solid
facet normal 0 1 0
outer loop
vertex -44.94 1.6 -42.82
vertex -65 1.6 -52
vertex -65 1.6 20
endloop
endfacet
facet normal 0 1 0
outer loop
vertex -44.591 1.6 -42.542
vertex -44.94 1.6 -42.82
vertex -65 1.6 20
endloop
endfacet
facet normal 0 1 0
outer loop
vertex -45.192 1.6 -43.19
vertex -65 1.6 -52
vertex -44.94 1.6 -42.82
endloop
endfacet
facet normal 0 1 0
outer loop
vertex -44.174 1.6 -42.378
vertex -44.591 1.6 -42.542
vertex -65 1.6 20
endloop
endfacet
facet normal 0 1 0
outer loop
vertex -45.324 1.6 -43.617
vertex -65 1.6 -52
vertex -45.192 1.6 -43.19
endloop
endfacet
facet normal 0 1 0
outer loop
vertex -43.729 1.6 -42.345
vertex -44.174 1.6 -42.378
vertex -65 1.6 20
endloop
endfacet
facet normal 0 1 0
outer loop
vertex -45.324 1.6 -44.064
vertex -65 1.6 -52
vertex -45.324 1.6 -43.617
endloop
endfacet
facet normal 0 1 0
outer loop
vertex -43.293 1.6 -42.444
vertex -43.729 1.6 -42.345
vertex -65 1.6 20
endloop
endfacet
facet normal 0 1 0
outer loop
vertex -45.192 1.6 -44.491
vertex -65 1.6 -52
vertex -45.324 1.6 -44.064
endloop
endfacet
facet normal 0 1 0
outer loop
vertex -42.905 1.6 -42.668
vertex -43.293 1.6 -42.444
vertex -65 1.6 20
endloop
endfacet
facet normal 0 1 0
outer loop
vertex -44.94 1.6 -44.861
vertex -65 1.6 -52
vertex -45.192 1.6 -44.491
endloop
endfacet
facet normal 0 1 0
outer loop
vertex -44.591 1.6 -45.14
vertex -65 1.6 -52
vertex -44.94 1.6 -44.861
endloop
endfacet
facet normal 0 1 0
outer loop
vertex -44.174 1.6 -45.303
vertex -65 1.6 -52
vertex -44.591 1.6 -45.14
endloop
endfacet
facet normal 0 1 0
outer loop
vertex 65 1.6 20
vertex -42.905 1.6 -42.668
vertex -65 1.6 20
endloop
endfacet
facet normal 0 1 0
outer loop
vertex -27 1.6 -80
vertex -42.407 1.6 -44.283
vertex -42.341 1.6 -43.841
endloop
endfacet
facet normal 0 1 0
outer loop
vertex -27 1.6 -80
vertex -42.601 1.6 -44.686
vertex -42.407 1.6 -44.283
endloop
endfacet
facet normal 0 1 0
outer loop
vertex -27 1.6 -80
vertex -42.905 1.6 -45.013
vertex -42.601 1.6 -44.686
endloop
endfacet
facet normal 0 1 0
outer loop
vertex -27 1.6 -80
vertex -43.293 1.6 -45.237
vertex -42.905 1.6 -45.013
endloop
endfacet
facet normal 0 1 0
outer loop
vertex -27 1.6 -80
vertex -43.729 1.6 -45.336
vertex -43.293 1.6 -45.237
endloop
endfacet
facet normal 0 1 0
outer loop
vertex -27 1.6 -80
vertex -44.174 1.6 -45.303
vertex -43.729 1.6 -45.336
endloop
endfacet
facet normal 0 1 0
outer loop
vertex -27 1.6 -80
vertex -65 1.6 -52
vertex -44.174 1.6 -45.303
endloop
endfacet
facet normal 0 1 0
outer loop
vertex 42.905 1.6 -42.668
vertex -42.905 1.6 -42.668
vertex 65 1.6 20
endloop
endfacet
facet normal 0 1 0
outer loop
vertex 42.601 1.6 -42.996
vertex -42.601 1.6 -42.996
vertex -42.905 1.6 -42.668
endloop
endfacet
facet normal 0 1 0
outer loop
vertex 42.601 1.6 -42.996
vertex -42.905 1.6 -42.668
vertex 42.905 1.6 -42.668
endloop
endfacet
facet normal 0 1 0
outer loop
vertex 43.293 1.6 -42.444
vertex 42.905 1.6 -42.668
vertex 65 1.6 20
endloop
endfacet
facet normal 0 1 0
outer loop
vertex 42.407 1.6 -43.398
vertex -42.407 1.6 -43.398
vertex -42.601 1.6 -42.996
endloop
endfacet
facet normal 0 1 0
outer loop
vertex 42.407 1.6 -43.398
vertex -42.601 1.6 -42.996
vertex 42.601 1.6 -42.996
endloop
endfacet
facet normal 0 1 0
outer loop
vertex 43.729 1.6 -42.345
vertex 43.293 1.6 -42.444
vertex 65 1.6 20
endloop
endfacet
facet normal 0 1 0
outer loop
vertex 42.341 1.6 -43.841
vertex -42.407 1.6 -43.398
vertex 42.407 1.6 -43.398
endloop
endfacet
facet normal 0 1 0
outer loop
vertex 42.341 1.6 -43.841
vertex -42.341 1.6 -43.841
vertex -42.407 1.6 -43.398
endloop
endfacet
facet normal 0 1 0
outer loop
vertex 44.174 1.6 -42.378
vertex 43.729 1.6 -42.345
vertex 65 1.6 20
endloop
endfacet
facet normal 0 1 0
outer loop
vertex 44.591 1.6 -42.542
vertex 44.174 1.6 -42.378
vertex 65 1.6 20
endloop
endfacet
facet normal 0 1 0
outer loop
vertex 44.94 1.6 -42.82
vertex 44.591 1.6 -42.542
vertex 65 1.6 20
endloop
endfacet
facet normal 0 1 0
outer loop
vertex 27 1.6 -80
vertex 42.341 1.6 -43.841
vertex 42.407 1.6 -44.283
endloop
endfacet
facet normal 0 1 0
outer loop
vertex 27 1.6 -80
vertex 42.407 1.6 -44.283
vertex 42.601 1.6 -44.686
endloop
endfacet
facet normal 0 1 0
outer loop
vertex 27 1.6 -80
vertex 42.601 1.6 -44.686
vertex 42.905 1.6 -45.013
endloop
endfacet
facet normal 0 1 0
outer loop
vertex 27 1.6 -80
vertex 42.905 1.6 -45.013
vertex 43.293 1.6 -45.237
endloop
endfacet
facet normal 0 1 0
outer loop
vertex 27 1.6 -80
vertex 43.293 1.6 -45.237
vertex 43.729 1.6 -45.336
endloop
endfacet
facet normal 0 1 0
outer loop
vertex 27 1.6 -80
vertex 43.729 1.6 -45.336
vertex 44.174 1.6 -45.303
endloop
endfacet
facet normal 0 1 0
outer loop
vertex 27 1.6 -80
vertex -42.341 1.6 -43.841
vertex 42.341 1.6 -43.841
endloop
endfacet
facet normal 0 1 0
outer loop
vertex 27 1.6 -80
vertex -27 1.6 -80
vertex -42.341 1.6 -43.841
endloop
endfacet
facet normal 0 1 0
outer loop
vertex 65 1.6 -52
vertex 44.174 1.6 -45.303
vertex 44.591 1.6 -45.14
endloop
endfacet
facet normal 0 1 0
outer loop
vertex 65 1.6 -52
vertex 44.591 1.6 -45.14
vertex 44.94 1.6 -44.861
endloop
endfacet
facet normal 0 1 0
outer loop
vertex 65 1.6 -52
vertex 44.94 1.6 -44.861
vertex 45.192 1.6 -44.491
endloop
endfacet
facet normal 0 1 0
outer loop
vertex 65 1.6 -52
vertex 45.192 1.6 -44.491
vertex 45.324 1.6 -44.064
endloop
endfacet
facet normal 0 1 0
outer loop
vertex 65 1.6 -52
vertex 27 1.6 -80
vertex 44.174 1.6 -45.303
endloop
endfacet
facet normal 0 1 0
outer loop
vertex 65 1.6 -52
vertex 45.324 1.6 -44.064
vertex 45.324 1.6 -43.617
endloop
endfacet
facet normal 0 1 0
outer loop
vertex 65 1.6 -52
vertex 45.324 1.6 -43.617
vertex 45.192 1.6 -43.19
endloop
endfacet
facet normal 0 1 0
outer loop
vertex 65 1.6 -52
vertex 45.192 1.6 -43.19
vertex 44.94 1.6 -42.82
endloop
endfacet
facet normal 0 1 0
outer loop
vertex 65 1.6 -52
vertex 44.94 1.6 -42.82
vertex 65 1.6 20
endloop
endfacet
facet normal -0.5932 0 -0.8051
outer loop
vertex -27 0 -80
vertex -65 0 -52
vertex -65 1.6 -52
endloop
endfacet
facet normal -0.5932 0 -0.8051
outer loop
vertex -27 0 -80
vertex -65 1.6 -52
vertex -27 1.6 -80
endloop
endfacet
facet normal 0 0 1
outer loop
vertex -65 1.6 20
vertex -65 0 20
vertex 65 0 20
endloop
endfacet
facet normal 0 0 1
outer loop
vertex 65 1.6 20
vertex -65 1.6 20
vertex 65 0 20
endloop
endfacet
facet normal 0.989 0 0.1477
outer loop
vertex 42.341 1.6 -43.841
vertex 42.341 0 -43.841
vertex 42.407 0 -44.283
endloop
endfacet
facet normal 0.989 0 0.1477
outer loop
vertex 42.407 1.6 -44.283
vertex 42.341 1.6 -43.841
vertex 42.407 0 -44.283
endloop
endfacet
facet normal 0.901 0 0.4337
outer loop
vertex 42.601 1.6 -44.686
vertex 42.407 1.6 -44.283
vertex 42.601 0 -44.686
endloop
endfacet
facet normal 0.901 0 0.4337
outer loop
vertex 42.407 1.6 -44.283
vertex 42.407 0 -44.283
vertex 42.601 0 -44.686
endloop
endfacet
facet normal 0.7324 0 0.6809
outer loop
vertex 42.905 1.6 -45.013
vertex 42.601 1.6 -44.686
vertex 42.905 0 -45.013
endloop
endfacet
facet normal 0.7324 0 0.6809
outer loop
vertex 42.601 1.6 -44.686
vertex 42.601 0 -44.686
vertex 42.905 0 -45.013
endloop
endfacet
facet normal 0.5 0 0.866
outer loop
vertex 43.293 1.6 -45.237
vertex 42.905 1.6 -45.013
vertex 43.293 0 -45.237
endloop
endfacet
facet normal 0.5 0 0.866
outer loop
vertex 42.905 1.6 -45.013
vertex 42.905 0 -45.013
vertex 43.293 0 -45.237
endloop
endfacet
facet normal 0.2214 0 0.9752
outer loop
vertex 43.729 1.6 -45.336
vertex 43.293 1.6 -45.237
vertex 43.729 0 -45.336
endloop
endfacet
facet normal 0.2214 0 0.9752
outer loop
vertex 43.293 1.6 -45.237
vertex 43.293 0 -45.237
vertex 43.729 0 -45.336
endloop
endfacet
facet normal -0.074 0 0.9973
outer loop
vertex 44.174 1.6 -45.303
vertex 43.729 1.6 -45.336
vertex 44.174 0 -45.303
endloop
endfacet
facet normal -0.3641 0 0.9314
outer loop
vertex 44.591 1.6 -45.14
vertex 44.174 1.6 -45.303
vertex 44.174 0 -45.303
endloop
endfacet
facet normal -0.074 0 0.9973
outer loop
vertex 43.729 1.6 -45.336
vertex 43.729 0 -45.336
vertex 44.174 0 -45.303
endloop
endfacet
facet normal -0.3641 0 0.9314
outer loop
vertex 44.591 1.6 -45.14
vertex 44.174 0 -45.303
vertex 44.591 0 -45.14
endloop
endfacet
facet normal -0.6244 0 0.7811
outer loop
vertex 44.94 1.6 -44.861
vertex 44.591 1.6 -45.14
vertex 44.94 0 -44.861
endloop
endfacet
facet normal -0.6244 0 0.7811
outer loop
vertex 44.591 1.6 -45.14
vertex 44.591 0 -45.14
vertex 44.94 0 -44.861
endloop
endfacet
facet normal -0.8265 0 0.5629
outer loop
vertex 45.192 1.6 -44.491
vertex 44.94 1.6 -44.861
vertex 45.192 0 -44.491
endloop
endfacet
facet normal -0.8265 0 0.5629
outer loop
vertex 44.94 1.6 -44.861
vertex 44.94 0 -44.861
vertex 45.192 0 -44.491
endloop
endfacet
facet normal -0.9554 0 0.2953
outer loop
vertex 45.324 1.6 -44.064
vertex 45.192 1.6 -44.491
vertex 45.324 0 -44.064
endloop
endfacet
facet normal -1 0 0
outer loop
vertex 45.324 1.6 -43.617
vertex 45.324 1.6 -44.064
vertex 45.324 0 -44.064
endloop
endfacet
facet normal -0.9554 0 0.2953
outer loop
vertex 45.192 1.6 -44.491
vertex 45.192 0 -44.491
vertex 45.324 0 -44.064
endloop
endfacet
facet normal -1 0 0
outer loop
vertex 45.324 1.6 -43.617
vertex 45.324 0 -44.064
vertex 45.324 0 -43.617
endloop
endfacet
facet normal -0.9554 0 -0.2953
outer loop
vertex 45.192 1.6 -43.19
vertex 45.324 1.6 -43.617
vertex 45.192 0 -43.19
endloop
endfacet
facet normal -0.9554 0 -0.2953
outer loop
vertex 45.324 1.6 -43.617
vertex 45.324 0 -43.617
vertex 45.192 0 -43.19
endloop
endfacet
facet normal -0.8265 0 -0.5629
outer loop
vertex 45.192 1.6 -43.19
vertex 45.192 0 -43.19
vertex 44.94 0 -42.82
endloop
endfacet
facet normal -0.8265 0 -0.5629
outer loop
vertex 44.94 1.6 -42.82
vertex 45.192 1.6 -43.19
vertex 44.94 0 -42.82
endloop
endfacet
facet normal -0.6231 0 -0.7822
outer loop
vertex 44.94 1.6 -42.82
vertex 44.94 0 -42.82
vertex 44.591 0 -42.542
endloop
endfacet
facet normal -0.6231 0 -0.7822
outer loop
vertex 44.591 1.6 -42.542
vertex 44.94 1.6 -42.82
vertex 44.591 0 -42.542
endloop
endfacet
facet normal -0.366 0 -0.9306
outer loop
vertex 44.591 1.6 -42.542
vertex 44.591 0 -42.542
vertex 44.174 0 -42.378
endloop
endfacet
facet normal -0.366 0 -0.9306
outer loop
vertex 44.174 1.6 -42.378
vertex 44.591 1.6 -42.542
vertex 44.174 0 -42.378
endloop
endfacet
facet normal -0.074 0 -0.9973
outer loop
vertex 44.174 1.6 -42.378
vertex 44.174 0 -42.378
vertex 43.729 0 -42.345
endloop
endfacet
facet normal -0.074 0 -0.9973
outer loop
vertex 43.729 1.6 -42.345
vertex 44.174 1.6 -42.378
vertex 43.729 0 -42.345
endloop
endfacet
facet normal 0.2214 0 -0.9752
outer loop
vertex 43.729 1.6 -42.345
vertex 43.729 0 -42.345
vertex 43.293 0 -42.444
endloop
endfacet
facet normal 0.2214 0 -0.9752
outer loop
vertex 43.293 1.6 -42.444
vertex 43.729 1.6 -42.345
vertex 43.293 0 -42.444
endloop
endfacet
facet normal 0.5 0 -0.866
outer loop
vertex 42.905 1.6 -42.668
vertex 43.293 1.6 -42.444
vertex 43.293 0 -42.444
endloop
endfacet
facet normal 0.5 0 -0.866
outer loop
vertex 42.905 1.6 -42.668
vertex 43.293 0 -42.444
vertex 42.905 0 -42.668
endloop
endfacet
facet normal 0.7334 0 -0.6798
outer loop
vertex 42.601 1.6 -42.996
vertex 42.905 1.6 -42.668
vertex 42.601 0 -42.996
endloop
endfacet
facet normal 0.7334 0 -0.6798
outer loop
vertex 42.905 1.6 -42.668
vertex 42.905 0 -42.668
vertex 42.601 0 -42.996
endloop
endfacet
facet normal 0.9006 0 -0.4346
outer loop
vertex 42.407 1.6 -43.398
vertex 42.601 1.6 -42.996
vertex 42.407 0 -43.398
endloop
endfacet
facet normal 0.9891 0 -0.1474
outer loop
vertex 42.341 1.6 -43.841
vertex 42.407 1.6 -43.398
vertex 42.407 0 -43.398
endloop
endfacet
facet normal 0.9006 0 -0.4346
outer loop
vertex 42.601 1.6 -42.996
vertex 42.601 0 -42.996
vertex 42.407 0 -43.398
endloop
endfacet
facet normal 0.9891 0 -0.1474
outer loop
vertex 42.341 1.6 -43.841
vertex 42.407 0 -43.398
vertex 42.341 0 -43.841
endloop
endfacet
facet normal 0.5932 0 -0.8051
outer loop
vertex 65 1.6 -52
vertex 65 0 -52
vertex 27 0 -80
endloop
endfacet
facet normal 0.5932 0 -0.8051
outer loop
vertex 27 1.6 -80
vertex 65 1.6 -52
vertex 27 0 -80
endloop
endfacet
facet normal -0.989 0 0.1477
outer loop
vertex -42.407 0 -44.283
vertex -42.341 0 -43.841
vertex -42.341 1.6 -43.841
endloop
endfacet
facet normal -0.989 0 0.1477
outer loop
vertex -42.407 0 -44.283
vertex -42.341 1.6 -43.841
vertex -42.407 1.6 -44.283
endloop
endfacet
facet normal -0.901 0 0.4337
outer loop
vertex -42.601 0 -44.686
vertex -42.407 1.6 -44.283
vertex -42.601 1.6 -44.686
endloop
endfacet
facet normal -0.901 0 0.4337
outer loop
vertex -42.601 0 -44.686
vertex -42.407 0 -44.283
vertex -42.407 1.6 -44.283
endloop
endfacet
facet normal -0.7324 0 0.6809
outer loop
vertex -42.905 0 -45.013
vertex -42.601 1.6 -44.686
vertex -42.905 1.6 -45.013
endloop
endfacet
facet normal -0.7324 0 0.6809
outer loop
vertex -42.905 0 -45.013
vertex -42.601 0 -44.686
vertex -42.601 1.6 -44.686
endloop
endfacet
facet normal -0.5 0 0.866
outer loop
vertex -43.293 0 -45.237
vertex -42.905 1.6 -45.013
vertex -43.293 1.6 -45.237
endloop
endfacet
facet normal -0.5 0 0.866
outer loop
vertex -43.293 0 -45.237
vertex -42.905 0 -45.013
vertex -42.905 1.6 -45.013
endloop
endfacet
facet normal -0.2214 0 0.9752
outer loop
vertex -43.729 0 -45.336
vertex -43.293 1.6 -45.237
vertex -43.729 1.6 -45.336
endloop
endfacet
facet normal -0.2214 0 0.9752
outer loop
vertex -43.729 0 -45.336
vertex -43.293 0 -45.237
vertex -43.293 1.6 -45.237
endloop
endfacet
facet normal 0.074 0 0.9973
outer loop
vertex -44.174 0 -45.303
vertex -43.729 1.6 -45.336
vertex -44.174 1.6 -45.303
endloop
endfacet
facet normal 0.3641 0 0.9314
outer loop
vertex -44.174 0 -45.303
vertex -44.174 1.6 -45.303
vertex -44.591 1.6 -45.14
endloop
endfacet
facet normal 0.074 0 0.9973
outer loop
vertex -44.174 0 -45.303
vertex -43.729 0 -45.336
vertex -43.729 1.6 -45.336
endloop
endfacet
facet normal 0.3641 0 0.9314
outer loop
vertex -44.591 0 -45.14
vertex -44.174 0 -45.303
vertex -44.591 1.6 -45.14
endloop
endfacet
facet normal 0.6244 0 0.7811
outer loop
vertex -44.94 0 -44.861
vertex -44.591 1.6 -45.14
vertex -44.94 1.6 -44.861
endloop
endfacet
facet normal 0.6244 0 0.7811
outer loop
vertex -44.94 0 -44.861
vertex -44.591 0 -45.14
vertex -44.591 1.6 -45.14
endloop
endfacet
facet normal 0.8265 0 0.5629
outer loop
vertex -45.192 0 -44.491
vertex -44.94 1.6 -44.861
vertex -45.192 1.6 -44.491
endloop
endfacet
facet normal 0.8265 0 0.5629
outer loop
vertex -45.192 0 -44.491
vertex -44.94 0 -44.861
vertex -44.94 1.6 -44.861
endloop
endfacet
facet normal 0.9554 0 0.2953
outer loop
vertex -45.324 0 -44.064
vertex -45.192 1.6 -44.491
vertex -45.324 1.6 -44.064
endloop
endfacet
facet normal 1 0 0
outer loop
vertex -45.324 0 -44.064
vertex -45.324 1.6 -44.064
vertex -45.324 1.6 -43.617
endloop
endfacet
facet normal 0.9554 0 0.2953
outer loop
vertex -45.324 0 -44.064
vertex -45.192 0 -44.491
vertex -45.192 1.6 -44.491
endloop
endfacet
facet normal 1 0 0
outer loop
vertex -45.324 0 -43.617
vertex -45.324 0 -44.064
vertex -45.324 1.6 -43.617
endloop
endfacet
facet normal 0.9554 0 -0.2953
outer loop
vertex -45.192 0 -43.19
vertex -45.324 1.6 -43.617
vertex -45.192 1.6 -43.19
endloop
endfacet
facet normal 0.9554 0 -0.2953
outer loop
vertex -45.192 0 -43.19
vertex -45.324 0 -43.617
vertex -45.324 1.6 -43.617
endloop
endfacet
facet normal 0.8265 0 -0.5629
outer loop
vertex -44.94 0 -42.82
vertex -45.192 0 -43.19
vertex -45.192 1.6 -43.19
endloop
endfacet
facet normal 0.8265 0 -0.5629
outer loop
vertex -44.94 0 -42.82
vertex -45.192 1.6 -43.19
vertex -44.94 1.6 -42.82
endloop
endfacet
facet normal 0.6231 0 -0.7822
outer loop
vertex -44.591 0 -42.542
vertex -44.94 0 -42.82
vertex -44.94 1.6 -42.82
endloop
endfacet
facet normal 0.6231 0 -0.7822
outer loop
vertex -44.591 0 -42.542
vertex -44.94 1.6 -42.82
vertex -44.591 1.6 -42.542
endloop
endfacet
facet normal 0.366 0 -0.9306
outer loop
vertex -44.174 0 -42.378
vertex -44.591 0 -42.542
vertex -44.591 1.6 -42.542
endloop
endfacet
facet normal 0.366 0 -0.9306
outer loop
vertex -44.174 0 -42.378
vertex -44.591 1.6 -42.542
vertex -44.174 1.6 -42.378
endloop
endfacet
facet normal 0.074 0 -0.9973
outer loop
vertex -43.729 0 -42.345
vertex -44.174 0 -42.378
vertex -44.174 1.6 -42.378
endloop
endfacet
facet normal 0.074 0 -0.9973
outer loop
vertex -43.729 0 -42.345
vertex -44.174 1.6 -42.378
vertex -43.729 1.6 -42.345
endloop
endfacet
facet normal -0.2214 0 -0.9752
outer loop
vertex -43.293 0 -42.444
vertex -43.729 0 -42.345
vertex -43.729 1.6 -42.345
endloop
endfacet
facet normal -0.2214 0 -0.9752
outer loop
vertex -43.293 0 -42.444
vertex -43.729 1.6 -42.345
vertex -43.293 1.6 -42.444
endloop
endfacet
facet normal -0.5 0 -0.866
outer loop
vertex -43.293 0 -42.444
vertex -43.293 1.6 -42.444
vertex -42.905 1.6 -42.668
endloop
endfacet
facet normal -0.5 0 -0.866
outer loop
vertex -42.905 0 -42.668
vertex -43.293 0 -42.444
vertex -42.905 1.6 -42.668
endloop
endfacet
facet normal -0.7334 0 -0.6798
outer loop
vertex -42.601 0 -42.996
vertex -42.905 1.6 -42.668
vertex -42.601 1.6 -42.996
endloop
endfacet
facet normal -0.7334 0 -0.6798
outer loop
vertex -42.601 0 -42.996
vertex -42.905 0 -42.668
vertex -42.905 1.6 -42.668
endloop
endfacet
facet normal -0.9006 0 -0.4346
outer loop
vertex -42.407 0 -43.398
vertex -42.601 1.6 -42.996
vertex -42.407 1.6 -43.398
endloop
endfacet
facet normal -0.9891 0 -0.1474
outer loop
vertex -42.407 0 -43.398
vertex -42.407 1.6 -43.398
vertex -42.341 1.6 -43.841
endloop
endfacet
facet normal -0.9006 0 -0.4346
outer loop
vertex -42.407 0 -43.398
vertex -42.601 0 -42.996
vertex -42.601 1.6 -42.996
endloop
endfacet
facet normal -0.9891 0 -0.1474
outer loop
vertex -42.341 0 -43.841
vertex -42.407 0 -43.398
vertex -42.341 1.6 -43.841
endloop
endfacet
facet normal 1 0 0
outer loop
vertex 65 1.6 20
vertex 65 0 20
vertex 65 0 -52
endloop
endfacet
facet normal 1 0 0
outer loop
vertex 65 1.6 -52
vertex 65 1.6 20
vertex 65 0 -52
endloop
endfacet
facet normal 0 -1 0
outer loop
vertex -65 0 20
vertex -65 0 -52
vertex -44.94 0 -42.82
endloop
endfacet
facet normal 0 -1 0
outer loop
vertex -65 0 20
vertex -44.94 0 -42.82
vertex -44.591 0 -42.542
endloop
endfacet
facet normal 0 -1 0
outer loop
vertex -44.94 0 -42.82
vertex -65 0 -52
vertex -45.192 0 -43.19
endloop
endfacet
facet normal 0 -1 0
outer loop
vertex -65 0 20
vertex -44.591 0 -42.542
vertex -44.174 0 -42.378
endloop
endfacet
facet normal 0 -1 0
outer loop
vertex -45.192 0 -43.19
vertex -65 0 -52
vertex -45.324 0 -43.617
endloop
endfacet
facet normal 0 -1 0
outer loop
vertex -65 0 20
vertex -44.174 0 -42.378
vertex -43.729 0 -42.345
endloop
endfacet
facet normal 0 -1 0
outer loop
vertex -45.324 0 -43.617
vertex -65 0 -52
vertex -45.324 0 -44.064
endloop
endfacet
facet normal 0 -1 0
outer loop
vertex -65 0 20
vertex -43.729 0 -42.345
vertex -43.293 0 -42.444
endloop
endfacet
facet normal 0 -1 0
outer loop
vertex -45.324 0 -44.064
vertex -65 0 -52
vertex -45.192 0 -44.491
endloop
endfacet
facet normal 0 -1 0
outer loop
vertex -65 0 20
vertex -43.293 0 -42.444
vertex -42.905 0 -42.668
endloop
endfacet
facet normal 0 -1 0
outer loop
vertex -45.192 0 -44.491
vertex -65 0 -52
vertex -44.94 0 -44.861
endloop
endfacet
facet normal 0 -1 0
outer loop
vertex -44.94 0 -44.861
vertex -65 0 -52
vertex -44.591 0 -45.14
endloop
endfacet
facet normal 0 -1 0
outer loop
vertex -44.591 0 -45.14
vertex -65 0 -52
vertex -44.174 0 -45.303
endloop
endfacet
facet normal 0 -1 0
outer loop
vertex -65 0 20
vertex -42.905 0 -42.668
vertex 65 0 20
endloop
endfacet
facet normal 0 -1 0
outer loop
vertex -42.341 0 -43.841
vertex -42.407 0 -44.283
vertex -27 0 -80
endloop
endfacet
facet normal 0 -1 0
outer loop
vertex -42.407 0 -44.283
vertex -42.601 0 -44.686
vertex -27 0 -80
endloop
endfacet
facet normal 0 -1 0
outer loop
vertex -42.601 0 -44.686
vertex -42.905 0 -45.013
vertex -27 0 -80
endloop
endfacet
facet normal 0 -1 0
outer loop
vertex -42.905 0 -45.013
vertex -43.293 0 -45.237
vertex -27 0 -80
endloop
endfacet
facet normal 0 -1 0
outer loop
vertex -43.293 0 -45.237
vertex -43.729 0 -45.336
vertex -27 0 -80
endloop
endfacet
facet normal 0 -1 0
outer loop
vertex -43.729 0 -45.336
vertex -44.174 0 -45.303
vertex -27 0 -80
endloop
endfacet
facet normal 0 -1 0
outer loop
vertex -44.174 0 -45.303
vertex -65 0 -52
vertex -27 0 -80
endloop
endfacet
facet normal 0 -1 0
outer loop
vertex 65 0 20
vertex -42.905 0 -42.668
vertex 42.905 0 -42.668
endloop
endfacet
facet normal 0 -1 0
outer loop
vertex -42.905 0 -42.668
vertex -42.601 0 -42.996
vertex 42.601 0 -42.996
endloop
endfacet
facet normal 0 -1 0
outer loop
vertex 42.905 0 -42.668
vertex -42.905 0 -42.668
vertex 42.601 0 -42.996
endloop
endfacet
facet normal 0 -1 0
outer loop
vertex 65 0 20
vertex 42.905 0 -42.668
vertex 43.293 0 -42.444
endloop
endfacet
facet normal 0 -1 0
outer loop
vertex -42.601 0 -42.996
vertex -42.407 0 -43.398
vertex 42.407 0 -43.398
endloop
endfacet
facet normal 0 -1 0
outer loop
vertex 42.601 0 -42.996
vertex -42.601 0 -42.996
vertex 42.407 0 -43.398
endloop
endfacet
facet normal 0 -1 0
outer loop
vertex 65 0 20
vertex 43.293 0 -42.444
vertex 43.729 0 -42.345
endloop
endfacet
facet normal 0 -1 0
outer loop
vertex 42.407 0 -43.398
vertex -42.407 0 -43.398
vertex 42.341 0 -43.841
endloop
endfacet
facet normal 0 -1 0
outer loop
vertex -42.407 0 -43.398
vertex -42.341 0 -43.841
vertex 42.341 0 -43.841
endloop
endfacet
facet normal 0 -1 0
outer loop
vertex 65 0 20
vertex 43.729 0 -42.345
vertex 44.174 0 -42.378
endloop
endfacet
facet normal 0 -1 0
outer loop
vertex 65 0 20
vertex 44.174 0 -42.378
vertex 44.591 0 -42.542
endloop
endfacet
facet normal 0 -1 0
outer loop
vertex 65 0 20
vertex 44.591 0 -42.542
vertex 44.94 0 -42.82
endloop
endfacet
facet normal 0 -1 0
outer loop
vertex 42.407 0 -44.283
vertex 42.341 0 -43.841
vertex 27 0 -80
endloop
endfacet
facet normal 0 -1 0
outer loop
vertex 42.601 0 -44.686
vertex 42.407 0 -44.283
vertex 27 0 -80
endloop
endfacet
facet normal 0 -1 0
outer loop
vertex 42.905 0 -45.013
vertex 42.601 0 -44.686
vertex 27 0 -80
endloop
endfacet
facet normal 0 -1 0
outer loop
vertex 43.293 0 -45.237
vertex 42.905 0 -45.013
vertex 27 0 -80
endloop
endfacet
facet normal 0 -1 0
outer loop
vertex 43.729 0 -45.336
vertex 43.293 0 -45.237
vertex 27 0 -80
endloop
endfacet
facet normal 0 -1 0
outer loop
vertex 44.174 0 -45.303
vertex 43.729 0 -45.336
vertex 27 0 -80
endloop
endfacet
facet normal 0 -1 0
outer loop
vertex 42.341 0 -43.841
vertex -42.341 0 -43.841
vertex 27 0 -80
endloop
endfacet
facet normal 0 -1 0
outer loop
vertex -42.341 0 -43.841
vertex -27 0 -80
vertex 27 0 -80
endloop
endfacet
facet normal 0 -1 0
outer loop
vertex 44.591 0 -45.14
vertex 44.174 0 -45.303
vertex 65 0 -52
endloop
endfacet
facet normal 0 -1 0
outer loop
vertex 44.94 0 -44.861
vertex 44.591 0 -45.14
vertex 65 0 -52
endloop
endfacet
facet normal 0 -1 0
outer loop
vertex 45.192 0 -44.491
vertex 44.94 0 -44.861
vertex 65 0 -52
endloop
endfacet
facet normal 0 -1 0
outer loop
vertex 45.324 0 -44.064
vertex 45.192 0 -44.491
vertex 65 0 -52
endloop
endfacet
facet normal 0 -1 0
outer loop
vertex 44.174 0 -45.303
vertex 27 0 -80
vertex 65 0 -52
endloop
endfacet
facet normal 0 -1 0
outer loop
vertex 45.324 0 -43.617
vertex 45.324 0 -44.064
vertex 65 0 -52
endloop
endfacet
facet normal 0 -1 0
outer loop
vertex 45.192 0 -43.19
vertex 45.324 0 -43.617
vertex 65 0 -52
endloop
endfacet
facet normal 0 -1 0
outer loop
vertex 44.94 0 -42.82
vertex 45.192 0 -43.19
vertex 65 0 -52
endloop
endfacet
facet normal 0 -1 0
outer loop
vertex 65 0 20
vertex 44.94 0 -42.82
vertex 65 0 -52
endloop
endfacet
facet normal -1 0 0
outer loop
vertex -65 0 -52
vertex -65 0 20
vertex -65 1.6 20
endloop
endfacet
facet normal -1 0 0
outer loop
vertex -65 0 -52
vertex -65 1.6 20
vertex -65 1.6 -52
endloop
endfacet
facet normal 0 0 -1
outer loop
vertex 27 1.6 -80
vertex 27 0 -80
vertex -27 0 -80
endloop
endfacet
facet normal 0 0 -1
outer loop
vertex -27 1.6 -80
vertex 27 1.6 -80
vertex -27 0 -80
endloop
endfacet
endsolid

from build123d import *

# Parameters (mm, degrees)
SKETCH1_R           = 1.5
BOSS_EXTRUDE1_DEPTH = 1.6


with BuildPart() as part:
    # Sketch1 → Boss-Extrude1 (new body)
    with BuildSketch(Plane(origin=(0, 0, 0), x_dir=(1, 0, 0), z_dir=(0, 1, 0))):
        Polygon((-65, 52), (-27, 80), (0, 80), (0, -20), (-65, -20), align=None)
        with Locations((-43.840620434, 43.840620434)):
            Circle(SKETCH1_R, mode=Mode.SUBTRACT)
    boss_extrude1 = extrude(amount=BOSS_EXTRUDE1_DEPTH)

    # Mirror1: Boss-Extrude1 across plane
    add(boss_extrude1.mirror(Plane(origin=(0, 1.6, 20), x_dir=(0, 0, 1), z_dir=(-1, 0, 0))))


solid = part.part
